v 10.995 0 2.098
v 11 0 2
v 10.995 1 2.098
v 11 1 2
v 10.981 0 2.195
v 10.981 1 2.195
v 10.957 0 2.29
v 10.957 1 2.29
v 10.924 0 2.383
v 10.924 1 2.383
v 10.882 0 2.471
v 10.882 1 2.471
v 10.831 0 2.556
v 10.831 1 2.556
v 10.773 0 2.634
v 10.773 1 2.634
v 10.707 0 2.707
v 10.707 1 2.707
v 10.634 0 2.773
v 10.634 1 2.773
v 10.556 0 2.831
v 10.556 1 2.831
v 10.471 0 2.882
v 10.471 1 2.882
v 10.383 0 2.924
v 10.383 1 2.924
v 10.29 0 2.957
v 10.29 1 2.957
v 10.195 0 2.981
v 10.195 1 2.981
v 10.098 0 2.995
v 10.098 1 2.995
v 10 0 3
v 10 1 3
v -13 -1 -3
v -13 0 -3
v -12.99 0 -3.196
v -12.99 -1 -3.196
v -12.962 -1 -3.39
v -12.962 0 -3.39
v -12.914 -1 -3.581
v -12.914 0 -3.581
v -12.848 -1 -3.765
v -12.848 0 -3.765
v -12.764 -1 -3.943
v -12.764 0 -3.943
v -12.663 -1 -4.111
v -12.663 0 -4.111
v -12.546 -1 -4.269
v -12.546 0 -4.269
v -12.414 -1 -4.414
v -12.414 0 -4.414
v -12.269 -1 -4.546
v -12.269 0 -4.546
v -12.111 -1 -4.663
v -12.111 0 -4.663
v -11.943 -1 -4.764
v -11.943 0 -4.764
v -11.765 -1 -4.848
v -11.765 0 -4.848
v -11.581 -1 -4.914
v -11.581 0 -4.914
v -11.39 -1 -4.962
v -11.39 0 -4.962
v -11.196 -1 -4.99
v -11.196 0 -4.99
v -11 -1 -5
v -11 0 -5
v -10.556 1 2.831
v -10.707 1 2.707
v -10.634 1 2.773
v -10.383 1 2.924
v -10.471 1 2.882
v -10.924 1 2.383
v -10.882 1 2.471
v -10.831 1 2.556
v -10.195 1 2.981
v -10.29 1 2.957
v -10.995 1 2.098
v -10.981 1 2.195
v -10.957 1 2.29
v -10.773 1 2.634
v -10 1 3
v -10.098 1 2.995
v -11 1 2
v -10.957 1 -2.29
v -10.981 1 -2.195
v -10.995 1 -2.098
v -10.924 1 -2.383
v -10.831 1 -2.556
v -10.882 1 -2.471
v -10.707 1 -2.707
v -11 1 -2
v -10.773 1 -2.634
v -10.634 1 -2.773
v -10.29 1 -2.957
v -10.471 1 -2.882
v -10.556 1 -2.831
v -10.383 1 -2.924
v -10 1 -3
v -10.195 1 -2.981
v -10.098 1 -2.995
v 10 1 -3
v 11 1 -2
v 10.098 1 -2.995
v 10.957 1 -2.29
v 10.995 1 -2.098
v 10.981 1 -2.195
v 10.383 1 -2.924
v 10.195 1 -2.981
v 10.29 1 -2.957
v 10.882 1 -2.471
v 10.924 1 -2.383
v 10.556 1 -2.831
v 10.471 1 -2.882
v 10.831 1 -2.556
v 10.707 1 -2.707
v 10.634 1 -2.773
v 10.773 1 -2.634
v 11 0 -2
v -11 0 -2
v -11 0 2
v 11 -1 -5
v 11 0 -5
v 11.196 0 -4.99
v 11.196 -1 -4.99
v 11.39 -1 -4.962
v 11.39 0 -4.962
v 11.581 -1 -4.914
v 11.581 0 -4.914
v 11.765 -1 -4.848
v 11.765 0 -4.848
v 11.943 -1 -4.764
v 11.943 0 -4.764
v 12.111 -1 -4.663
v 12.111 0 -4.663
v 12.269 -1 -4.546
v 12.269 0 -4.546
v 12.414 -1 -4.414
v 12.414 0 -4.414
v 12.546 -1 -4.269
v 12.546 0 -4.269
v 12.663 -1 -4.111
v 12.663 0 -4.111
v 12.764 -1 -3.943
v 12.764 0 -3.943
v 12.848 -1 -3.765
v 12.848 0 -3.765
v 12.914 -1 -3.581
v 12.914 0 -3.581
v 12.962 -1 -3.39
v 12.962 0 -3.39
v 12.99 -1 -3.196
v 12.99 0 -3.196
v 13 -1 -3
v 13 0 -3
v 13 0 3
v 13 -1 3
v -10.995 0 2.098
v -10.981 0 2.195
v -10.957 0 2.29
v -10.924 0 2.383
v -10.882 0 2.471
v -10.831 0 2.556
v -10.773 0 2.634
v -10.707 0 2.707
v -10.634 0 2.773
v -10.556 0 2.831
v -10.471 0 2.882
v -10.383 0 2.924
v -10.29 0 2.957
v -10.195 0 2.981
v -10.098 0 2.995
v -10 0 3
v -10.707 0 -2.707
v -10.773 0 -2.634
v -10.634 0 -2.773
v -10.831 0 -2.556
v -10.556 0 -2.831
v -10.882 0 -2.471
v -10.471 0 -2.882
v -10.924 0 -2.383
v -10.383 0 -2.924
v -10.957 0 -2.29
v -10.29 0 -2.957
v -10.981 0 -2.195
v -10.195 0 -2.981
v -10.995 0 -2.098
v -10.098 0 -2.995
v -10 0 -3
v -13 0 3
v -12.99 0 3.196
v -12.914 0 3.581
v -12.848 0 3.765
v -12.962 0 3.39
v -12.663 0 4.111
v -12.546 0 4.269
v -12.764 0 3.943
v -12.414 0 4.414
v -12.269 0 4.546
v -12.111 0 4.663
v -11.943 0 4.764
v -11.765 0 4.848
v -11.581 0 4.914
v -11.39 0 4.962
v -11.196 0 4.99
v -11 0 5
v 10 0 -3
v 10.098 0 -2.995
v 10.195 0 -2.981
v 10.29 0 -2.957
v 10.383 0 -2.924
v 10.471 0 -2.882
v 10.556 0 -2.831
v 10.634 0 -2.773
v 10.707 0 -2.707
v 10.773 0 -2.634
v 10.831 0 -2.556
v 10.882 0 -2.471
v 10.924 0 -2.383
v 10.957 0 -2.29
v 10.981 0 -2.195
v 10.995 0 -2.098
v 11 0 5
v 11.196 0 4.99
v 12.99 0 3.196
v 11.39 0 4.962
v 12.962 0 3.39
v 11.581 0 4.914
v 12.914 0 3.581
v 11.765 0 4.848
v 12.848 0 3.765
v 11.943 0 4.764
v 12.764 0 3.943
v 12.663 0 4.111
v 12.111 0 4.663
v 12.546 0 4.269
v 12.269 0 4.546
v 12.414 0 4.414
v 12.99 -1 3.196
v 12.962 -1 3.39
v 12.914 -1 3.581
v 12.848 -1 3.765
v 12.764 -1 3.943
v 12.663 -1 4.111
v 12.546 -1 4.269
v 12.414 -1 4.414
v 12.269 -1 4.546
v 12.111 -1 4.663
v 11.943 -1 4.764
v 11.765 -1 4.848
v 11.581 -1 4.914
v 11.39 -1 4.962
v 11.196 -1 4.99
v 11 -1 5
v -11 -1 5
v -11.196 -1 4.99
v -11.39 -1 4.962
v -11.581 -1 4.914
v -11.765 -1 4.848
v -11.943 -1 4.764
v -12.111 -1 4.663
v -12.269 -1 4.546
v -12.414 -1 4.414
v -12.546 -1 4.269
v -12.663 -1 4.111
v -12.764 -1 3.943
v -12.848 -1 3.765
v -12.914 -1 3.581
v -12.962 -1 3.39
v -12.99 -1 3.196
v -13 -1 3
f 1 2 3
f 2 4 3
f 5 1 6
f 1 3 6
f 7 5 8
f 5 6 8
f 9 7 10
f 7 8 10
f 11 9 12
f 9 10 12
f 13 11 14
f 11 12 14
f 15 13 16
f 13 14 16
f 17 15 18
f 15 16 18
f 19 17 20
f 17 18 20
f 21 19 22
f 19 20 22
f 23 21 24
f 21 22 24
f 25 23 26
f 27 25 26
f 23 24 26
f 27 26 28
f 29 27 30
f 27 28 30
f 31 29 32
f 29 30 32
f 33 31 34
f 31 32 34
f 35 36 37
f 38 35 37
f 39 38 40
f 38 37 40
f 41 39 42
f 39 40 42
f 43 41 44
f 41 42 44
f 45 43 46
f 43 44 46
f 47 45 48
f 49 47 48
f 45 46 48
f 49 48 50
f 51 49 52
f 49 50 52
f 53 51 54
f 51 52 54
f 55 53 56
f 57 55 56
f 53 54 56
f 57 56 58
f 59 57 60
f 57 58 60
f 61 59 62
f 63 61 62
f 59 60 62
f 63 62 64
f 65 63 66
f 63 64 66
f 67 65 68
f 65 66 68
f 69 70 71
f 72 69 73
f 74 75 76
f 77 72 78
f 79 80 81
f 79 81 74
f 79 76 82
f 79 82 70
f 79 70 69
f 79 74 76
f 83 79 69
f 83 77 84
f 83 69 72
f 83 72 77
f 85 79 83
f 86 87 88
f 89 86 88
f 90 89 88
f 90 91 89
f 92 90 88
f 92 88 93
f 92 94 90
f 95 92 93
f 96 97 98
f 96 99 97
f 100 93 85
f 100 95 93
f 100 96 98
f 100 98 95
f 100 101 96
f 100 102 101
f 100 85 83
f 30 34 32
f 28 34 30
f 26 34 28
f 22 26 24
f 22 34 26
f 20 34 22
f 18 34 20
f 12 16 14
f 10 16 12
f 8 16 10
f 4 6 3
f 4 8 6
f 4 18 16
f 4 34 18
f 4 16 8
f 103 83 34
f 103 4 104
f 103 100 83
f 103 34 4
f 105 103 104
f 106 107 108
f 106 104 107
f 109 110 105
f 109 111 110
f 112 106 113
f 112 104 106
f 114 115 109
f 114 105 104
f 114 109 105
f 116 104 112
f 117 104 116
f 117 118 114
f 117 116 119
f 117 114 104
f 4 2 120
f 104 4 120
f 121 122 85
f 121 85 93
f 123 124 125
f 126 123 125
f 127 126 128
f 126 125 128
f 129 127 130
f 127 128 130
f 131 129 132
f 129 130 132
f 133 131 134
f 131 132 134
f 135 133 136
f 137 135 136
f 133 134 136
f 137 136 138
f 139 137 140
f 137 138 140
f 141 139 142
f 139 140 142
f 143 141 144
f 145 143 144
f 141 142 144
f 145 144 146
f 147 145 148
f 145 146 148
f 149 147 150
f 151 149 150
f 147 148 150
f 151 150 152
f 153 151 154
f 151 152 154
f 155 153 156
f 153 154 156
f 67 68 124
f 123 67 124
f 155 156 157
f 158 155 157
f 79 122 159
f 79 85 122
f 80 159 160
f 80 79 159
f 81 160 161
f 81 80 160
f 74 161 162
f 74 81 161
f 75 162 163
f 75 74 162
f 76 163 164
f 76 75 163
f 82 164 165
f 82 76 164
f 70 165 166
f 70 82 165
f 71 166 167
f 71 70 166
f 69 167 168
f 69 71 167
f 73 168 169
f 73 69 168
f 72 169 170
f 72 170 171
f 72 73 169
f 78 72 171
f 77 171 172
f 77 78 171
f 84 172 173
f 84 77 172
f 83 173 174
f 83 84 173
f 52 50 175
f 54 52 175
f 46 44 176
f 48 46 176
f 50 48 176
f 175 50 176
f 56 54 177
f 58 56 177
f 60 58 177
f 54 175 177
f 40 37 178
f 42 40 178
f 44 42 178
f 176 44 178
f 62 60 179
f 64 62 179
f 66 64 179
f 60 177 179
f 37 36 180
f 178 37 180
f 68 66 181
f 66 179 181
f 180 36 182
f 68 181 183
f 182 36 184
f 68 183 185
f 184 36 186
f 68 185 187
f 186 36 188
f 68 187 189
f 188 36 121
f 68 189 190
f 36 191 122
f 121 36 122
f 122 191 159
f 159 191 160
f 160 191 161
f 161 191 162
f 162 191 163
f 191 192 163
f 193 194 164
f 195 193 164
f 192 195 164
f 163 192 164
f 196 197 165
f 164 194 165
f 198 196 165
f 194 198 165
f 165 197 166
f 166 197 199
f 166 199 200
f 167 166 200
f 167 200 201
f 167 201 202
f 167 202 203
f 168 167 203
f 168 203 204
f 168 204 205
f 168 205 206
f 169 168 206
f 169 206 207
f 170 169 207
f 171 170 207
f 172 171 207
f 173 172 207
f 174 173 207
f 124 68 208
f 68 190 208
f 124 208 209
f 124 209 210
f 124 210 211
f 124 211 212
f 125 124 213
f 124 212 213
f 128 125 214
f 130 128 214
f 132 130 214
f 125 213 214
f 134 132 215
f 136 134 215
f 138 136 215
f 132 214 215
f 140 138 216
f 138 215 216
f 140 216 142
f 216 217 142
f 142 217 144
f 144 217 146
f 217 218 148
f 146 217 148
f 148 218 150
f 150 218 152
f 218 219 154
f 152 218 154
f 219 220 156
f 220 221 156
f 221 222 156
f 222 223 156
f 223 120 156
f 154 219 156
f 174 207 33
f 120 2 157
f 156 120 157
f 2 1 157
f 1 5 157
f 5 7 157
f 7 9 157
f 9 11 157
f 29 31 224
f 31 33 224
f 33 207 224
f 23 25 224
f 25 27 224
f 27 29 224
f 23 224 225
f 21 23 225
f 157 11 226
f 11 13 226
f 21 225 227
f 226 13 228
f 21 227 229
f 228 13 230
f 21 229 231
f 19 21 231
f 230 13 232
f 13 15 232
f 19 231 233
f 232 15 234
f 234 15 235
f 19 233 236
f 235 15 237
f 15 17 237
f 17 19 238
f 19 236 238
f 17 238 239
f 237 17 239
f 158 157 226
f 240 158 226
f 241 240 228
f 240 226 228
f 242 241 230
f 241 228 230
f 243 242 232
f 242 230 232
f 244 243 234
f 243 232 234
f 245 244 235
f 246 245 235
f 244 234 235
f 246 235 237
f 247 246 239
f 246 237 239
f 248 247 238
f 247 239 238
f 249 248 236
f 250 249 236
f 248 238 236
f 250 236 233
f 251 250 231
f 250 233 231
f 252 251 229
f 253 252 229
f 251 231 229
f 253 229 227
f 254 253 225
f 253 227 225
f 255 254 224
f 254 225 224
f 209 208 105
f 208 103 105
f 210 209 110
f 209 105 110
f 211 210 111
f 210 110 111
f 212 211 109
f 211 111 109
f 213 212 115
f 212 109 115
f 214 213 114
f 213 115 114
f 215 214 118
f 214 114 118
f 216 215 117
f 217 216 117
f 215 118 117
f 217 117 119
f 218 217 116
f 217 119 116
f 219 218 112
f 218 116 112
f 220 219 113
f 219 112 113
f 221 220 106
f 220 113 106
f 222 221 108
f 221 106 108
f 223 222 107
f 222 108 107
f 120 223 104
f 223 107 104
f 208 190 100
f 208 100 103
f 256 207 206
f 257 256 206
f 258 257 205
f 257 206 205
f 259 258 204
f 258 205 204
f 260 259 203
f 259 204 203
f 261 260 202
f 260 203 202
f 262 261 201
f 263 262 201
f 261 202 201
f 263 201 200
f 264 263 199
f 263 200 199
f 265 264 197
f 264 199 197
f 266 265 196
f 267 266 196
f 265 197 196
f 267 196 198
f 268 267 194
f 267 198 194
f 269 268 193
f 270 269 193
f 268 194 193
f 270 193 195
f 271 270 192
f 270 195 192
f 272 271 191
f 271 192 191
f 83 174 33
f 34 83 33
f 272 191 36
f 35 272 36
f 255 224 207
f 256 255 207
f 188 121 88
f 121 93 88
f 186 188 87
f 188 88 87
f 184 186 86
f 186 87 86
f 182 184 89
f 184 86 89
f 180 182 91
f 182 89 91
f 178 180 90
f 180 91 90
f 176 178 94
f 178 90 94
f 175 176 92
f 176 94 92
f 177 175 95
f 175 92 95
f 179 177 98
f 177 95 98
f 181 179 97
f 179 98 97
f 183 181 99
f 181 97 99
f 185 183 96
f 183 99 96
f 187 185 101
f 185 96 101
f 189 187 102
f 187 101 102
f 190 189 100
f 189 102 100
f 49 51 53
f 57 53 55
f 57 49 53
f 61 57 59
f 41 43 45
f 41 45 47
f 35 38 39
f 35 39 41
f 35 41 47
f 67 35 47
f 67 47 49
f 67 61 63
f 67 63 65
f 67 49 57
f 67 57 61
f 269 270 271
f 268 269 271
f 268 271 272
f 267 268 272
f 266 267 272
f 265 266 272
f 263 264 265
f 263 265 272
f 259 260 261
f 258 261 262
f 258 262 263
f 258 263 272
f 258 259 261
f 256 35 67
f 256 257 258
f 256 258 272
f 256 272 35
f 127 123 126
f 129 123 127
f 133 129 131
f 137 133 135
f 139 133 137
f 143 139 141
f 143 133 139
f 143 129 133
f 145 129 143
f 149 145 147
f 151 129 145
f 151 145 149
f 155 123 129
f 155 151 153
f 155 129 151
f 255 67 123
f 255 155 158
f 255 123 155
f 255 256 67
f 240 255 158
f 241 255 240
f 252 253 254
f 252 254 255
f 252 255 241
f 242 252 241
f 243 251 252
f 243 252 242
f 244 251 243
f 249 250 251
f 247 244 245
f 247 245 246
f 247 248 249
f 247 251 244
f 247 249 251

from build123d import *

# Parameters (mm, degrees)
SKETCH1_W           = 22
SKETCH1_H           = 6
BOSS_EXTRUDE1_DEPTH = 1
BOSS_EXTRUDE2_DEPTH = 1
FILLET1_R           = 1


with BuildPart() as part:
    # Sketch1 → Boss-Extrude1 (new body)
    with BuildSketch(Plane(origin=(0, 0, 0), x_dir=(1, 0, 0), z_dir=(0, 1, 0))):
        Rectangle(SKETCH1_W, SKETCH1_H)
    extrude(amount=BOSS_EXTRUDE1_DEPTH)

    # Sketch2 → Boss-Extrude2 (add)
    with BuildSketch(Plane.XZ):
        with BuildLine():
            Line((11, 5), (-11, 5))
            ThreePointArc((-11, 5), (-12.414213562, 4.414213562), (-13, 3))
            Line((-13, 3), (-13, -3))
            ThreePointArc((-13, -3), (-12.414213562, -4.414213562), (-11, -5))
            Line((-11, -5), (11, -5))
            ThreePointArc((11, -5), (12.414213562, -4.414213562), (13, -3))
            Line((13, -3), (13, 3))
            ThreePointArc((13, 3), (12.414213562, 4.414213562), (11, 5))
        make_face()
    extrude(amount=BOSS_EXTRUDE2_DEPTH)

    # Fillet1
    fillet1_edges = [part.edges().sort_by_distance(p)[0] for p in [
        (11, 0.5, 3),
        (11, 0.5, -3),
        (-11, 0.5, -3),
        (-11, 0.5, 3),
    ]]
    fillet(fillet1_edges, radius=FILLET1_R)


solid = part.part
